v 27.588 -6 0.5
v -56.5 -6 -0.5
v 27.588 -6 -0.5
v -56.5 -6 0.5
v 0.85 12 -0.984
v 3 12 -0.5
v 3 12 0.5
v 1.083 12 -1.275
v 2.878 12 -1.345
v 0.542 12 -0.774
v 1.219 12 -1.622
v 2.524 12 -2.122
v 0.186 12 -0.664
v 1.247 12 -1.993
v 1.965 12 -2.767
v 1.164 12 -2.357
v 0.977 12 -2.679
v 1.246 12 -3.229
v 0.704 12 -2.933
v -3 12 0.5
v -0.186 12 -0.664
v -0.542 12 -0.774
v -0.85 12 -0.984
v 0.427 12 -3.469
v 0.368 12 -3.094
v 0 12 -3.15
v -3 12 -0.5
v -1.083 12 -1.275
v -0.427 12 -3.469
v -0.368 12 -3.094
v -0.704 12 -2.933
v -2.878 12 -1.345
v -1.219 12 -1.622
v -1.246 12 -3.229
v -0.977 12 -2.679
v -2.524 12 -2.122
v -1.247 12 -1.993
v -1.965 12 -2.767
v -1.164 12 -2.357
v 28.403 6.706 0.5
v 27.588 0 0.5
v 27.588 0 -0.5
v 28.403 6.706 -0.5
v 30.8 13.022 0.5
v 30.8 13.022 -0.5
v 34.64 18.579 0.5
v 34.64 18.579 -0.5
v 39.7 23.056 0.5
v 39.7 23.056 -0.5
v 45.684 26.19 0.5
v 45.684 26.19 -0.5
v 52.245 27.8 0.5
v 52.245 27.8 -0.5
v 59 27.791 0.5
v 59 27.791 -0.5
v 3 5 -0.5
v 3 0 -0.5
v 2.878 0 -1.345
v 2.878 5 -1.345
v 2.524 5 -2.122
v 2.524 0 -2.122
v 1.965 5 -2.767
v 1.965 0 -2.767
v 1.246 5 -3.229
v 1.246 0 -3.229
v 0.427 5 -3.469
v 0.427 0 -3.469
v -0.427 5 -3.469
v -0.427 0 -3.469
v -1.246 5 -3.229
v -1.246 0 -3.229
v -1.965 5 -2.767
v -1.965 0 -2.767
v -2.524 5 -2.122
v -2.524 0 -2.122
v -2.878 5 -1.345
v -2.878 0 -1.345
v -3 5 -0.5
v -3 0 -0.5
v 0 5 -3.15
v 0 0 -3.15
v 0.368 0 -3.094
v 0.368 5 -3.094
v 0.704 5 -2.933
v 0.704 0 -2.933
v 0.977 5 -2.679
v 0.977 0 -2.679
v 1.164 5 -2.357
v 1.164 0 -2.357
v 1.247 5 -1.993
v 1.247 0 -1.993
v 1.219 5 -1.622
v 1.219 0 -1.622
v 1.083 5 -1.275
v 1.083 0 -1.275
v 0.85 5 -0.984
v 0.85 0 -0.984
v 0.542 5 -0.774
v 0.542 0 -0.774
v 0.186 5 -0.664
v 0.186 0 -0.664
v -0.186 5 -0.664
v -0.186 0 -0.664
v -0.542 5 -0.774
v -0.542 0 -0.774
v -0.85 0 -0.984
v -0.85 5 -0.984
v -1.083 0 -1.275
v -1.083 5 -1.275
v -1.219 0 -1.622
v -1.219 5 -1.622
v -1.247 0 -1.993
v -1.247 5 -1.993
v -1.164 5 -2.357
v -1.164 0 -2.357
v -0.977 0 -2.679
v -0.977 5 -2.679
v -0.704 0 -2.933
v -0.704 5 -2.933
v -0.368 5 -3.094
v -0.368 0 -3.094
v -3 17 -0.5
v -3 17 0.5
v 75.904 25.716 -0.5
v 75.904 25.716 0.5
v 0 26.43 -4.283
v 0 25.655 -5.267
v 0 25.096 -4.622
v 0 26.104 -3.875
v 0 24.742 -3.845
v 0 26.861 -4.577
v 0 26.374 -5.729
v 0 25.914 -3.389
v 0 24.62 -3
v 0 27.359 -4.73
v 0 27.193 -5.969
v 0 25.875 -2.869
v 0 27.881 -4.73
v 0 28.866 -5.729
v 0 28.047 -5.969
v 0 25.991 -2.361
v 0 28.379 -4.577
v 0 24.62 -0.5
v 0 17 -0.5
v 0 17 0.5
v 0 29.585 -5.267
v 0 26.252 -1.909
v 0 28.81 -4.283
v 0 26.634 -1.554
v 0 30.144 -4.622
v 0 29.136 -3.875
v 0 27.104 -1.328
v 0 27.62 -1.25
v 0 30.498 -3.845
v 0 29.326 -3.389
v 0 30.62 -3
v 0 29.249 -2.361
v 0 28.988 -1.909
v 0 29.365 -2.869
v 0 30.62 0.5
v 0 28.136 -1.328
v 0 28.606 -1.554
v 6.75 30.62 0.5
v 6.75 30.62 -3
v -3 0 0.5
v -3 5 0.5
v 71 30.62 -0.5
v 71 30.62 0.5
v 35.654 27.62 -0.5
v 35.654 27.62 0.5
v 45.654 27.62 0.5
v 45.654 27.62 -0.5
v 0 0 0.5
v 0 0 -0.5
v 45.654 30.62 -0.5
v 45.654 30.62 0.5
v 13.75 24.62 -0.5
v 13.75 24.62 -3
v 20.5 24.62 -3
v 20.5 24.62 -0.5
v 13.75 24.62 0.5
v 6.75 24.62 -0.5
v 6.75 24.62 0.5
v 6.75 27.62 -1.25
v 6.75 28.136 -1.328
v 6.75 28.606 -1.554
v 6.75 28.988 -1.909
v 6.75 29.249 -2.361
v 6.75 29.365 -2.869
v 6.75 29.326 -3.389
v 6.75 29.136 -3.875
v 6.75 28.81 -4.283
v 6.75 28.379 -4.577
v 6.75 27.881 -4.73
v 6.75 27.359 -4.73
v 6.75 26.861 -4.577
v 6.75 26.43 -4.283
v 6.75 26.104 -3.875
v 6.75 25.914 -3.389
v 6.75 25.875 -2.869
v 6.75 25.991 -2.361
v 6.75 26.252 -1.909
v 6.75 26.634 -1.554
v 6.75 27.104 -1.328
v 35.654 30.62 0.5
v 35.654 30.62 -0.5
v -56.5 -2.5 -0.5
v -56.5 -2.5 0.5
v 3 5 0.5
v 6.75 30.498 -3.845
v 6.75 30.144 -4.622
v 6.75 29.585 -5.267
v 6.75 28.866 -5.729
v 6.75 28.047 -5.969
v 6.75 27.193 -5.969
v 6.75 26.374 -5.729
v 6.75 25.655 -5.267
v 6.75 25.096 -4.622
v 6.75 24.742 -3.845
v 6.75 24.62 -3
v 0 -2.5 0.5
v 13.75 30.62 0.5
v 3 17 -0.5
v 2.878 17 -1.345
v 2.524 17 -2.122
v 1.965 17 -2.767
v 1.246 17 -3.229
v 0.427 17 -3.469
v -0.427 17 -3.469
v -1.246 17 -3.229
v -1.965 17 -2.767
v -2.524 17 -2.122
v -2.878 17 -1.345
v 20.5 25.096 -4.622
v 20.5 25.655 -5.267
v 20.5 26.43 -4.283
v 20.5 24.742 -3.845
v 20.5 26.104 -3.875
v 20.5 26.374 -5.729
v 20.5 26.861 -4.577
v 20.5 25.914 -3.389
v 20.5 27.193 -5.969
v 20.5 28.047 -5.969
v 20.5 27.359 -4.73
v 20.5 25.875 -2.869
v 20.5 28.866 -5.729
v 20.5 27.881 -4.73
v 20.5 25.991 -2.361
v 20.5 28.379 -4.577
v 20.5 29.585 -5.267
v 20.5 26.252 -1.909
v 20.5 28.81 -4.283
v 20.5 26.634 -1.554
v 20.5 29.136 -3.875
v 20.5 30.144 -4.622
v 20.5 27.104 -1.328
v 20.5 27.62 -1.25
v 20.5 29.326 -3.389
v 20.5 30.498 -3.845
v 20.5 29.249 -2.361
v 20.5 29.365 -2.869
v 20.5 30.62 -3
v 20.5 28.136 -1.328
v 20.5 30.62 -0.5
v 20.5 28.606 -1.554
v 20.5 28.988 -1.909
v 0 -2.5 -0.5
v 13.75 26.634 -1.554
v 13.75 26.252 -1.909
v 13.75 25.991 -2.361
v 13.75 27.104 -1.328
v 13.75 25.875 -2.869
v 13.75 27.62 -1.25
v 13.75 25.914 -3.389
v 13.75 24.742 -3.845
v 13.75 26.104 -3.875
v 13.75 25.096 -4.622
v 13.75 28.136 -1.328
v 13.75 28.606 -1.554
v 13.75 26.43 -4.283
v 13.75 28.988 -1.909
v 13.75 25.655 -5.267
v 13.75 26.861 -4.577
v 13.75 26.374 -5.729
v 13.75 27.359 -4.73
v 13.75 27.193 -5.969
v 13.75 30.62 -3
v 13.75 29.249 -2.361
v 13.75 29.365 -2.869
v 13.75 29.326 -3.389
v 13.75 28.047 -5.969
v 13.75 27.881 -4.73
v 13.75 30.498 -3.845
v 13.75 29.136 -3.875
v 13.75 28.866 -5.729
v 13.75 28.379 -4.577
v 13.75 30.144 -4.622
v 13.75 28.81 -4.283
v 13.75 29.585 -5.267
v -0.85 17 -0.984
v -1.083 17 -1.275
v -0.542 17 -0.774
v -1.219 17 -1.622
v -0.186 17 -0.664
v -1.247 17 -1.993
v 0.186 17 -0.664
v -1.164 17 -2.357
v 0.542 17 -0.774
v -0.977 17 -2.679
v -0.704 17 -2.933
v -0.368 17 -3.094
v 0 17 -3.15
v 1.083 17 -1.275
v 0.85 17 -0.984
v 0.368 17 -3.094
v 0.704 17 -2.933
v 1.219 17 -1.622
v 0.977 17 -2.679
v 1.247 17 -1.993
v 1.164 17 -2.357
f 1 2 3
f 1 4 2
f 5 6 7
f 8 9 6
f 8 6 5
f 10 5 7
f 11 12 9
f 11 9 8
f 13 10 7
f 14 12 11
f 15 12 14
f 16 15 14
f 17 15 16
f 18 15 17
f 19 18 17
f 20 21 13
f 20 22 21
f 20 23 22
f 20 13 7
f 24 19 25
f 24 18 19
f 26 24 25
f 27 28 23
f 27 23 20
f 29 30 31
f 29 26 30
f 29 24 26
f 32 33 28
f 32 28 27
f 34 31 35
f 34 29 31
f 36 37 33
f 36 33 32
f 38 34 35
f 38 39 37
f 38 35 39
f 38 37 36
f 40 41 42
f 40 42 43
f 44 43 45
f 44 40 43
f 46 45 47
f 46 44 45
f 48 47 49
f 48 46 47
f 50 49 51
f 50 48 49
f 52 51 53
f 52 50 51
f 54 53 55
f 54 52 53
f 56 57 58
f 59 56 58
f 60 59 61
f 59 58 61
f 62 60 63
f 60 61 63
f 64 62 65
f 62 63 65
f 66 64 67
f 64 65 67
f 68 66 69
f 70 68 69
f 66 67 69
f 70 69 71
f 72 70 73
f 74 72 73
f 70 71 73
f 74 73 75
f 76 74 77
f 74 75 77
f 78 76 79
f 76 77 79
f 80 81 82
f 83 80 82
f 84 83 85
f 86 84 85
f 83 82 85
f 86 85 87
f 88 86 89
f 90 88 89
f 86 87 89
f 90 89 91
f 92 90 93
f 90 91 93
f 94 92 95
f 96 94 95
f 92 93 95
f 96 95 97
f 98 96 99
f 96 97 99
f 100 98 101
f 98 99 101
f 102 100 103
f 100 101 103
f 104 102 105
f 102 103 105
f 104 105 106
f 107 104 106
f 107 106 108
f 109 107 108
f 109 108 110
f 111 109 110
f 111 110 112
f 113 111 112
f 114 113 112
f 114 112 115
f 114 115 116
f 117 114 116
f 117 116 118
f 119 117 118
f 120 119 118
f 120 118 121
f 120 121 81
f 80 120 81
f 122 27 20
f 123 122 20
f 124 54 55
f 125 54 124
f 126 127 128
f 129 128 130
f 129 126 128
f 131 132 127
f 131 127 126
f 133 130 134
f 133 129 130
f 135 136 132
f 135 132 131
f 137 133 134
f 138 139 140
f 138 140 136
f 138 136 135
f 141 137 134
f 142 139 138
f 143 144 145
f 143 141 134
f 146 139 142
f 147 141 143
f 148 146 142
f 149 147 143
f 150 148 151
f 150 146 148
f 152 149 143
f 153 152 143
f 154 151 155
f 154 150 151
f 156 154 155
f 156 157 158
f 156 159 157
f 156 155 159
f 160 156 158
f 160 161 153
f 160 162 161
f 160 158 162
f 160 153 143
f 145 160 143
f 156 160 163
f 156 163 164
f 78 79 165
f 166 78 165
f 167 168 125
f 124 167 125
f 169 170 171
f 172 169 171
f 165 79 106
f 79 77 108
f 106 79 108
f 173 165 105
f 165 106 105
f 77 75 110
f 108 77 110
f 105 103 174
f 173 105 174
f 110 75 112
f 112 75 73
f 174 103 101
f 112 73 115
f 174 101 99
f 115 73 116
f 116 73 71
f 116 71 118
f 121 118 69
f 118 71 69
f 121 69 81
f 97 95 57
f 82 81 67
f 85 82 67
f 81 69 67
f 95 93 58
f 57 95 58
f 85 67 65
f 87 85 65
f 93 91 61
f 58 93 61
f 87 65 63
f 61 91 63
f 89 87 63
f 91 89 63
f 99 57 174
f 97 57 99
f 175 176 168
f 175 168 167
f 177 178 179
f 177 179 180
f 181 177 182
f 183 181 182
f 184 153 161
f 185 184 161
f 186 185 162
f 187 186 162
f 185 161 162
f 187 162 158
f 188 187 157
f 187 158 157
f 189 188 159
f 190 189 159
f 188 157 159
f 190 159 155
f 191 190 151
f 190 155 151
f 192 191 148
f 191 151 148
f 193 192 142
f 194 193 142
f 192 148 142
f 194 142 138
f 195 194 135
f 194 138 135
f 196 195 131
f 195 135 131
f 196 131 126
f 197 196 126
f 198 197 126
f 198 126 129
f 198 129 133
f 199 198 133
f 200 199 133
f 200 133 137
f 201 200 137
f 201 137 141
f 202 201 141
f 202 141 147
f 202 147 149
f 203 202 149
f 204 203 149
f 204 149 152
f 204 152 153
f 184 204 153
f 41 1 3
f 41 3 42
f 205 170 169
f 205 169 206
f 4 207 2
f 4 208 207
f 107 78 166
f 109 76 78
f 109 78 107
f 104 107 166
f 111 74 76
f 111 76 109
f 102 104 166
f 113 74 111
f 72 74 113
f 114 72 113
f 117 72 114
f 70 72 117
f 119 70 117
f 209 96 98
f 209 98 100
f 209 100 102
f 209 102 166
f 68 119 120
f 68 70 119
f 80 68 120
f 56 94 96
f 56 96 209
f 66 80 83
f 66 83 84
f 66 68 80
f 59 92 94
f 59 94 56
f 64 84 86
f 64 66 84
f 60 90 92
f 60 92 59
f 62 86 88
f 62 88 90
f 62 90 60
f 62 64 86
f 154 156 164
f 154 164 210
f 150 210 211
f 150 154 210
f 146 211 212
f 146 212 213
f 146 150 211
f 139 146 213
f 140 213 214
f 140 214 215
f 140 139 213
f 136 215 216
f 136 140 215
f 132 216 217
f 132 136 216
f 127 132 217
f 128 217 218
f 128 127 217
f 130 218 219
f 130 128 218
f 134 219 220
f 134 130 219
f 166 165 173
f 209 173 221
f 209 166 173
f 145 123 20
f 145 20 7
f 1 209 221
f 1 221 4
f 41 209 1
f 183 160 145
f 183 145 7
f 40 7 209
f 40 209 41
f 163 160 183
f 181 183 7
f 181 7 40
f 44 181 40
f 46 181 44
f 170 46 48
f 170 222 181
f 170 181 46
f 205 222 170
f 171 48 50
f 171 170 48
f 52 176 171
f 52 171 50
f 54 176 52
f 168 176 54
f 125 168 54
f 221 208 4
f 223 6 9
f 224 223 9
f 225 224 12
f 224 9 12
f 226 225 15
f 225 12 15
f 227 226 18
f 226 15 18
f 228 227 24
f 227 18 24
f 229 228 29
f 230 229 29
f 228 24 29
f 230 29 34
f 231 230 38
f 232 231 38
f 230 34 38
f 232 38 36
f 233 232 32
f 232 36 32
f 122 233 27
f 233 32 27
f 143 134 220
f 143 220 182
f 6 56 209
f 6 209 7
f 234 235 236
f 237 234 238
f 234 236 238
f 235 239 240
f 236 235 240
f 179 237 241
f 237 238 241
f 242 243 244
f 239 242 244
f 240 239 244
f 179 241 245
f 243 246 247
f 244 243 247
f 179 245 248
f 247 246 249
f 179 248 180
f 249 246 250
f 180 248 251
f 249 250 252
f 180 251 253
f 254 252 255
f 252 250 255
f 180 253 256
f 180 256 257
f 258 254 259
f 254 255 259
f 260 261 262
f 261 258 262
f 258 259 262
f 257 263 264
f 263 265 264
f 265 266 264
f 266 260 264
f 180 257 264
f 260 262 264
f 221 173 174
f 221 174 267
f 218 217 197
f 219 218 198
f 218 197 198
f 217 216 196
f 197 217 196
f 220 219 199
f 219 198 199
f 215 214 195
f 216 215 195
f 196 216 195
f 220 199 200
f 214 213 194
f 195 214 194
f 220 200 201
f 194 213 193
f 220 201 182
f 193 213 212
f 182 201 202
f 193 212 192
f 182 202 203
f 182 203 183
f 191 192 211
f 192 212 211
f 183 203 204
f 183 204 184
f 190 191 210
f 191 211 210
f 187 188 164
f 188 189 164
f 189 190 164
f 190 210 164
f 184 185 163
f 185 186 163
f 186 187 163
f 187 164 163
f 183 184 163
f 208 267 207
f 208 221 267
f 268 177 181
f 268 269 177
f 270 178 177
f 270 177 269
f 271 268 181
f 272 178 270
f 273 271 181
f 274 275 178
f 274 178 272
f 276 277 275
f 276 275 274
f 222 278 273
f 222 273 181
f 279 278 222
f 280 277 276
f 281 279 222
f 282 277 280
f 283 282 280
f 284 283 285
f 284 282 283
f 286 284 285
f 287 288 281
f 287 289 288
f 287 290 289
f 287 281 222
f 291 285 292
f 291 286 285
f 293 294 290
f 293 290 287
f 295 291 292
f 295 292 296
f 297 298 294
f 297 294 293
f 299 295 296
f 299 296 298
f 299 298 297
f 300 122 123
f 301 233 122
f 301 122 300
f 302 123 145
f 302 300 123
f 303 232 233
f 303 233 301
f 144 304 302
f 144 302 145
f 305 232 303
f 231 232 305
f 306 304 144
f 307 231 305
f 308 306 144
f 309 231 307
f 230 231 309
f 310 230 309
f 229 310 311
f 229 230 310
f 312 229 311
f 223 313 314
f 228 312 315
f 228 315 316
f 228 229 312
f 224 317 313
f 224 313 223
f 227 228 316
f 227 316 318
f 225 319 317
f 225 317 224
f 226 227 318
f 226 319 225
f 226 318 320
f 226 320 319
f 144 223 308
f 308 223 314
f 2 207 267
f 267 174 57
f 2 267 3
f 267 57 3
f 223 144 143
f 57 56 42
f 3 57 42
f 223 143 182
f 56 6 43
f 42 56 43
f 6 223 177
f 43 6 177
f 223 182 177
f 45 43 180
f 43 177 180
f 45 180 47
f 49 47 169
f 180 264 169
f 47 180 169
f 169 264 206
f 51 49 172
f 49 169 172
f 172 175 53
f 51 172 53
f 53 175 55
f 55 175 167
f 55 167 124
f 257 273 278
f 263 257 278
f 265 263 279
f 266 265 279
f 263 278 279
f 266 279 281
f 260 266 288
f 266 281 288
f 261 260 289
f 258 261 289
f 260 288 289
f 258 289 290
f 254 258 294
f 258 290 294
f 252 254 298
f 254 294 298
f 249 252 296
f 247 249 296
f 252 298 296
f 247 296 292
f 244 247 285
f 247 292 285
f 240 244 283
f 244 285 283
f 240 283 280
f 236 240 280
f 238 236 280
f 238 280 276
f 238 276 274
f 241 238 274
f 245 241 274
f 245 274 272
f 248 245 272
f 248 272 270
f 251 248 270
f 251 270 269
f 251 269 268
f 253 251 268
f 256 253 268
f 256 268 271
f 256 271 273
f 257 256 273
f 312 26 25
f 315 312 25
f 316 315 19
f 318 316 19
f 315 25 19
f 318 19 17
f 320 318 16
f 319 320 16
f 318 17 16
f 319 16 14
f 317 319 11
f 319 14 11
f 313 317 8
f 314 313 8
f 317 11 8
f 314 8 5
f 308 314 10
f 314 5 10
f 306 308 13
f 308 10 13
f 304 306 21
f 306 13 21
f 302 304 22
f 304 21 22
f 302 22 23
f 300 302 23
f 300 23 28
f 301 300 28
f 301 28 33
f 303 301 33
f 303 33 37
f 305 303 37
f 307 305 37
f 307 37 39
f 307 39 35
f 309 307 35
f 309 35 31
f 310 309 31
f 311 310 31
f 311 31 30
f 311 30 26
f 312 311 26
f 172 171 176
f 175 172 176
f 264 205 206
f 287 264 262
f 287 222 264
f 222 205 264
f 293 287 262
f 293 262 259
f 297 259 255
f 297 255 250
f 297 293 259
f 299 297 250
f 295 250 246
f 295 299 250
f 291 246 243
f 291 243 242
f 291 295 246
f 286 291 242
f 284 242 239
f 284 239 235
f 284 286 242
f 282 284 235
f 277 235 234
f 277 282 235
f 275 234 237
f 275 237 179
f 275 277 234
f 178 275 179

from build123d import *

# Parameters (mm, degrees)
BOSS_EXTRUDE1_DEPTH = 0.5
BOSS_EXTRUDE6_DEPTH = 5
BOSS_EXTRUDE5_DEPTH = 6.75
LPATTERN2_COUNT     = 2
LPATTERN2_PITCH     = 13.75
CUT_EXTRUDE4_REACH  = 84.156
SKETCH10_R          = 1.75
LPATTERN3_COUNT     = 2
LPATTERN3_PITCH     = 12
CUT_EXTRUDE5_REACH  = 84.156
SKETCH12_R          = 1.25
SKETCH13_W          = 7
SKETCH13_H          = 6
CUT_EXTRUDE6_DEPTH  = 1
CHAMFER1_SIZE       = 5
CUT_EXTRUDE8_REACH  = 84.105
SKETCH15_W          = 10
SKETCH15_H          = 3
CUT_EXTRUDE9_REACH  = 84.032
SKETCH16_W          = 3
SKETCH16_H          = 7


with BuildPart() as part:
    # Sketch1 → Boss-Extrude1 (new, symmetric)
    with BuildSketch(Plane.XY):
        with BuildLine():
            Line((-56.5, -6), (27.587658385, -6))
            Line((27.587658385, -6), (27.587658385, 0))
            ThreePointArc((27.587658385, 0), (37.034297035, 20.970760182), (59, 27.791292246))
            Line((59, 27.791292246), (76, 25.703954711))
            Line((76, 25.703954711), (76, 30.62))
            Line((76, 30.62), (0, 30.62))
            Line((0, 30.62), (0, -2.5))
            Line((0, -2.5), (-56.5, -2.5))
            Line((-56.5, -2.5), (-56.5, -6))
        make_face()
    extrude(amount=BOSS_EXTRUDE1_DEPTH, both=True)

    # Sketch5 → Boss-Extrude6 (add)
    with BuildSketch(Plane(origin=(0, 0, 0), x_dir=(1, 0, 0), z_dir=(0, 1, 0))):
        with BuildLine():
            Line((0, 0.5), (3, 0.5))
            ThreePointArc((3, 0.5), (0, 3.5), (-3, 0.5))
            Line((-3, 0.5), (-3, -0.5))
            Line((-3, -0.5), (0, -0.5))
            Line((0, -0.5), (0, 0.5))
        make_face()
    boss_extrude6 = extrude(amount=BOSS_EXTRUDE6_DEPTH)

    # Sketch9 → Boss-Extrude5 (add)
    with BuildSketch(Plane.ZY):
        with BuildLine():
            Line((-0.5, 30.62), (-3, 30.62))
            ThreePointArc((-3, 30.62), (-6, 27.62), (-3, 24.62))
            Line((-3, 24.62), (-0.5, 24.62))
            Line((-0.5, 24.62), (-0.5, 30.62))
        make_face()
    boss_extrude5 = extrude(amount=-BOSS_EXTRUDE5_DEPTH)

    # LPattern2: Boss-Extrude5 ×2
    with Locations(*[(i * LPATTERN2_PITCH, 0, 0) for i in range(1, LPATTERN2_COUNT)]):
        add(boss_extrude5)

    # Cut-Extrude4: up to this face of the body (flat: up to its plane)
    cut_extrude4_end = Plane(part.part.faces().sort_by_distance((20.5, 27.62, -2.97425968))[0])
    # Sketch10 → Cut-Extrude4 (cut, up to the picked face)
    with BuildSketch(Plane.ZY, mode=Mode.PRIVATE) as cut_extrude4_sk1:
        with Locations((-3, 27.62)):
            Circle(SKETCH10_R)
    cut_extrude4_tool1 = split(extrude(cut_extrude4_sk1.sketch, amount=-CUT_EXTRUDE4_REACH, mode=Mode.PRIVATE), bisect_by=cut_extrude4_end, keep=Keep.BOTH, mode=Mode.PRIVATE)
    add(cut_extrude4_tool1.solids().sort_by(Axis((0, 27.62, -3), (1, 0, 0)))[0], mode=Mode.SUBTRACT)

    # LPattern3: Boss-Extrude6 ×2
    with Locations(*[(0, i * LPATTERN3_PITCH, 0) for i in range(1, LPATTERN3_COUNT)]):
        add(boss_extrude6)

    # Cut-Extrude5: up to this face of the body (flat: up to its plane)
    cut_extrude5_end = Plane(part.part.faces().sort_by_distance((-0.26258716, 17, -1.462819587))[0])
    # Sketch12 → Cut-Extrude5 (cut, up to the picked face)
    with BuildSketch(Plane.XZ, mode=Mode.PRIVATE) as cut_extrude5_sk1:
        with Locations(Location((0, -1.9, 0), (0, 0, 270))):
            Circle(SKETCH12_R)
    cut_extrude5_tool1 = split(extrude(cut_extrude5_sk1.sketch, amount=-CUT_EXTRUDE5_REACH, mode=Mode.PRIVATE), bisect_by=cut_extrude5_end, keep=Keep.BOTH, mode=Mode.PRIVATE)
    add(cut_extrude5_tool1.solids().sort_by(Axis((0, 0, -1.9), (0, 1, 0)))[0], mode=Mode.SUBTRACT)

    # Sketch13 → Cut-Extrude6 (cut)
    with BuildSketch(Plane(origin=(0, 0, -0.5), x_dir=(-1, 0, 0), z_dir=(0, 0, -1))):
        with Locations((-10.25, 27.62)):
            Rectangle(SKETCH13_W, SKETCH13_H)
    extrude(amount=-CUT_EXTRUDE6_DEPTH, mode=Mode.SUBTRACT)

    # Chamfer1
    # the kernel refuses this chamfer: 5 mm, written as the material it takes off along each edge
    with BuildSketch(Plane(origin=(76, 30.62, 13.35841494), x_dir=(-0.9996219169112968, 0.027495876610586282, 0), z_dir=(0, 0, -1))) as chamfer1_piece_1:
        Polygon((CHAMFER1_SIZE * 0.999621916911, -CHAMFER1_SIZE * 0.0274958766106), (-CHAMFER1_SIZE * 0.0274958766106, -CHAMFER1_SIZE * 0.999621916911), (0, 0), align=None)
    extrude(amount=26.71682988, mode=Mode.SUBTRACT)

    # Sketch15 → Cut-Extrude8 (cut, up to next)
    with BuildSketch(Plane.XY.offset(0.5), mode=Mode.PRIVATE) as cut_extrude8_sk1:
        with Locations((40.65429408, 29.12)):
            Rectangle(SKETCH15_W, SKETCH15_H)
    cut_extrude8_tool1 = extrude(cut_extrude8_sk1.sketch, amount=-CUT_EXTRUDE8_REACH, mode=Mode.PRIVATE) & part.part
    add(cut_extrude8_tool1.solids().sort_by_distance((40.654294, 29.12, 0.5))[0], mode=Mode.SUBTRACT)

    # Sketch16 → Cut-Extrude9 (cut, up to next)
    with BuildSketch(Plane(origin=(0, 0, -0.5), x_dir=(-1, 0, 0), z_dir=(0, 0, -1)), mode=Mode.PRIVATE) as cut_extrude9_sk1:
        with Locations((-1.5, 8.5)):
            Rectangle(SKETCH16_W, SKETCH16_H)
    cut_extrude9_tool1 = extrude(cut_extrude9_sk1.sketch, amount=-CUT_EXTRUDE9_REACH, mode=Mode.PRIVATE) & part.part
    add(cut_extrude9_tool1.solids().sort_by_distance((1.5, 8.5, -0.5))[0], mode=Mode.SUBTRACT)


solid = part.part
